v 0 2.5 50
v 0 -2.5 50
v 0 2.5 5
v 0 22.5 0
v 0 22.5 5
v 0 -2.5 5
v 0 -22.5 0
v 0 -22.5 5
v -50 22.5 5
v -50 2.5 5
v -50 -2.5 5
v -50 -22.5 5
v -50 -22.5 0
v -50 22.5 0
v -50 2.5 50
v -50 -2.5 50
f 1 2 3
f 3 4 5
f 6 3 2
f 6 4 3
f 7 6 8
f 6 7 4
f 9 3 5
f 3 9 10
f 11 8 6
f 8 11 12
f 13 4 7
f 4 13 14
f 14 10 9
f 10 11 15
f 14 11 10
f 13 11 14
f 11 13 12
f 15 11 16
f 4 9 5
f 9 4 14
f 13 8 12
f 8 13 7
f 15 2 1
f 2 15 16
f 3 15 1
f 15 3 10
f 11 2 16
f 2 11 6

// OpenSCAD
// Built by bench/smallmodels/features/compiler.py from a list of features.
$fn = 64;
difference() {
  union() {
    translate([-25, 0, 0]) translate([-25, -22.5, 0]) cube([50, 45, 5]);
    translate([-25, 0, 0]) translate([-25, -2.5, 0]) cube([50, 5, 50]);
  }
  union() {
    translate([-17, 30, 3.5]) rotate([0, 0, 0]) rotate([0, 90, 0]) cylinder(d = 4.5, h = 1200, center = true);
    translate([17, 30, 3.5]) rotate([0, 0, 0]) rotate([0, 90, 0]) cylinder(d = 4.5, h = 1200, center = true);
    translate([0, 28, 0]) rotate([0, 0, 0]) translate([-11.5, -1.7, 0]) cube([23, 3.4, 50]);
  }
}
union() {
    translate([-25, 0, 0]) linear_extrude(height = 5) polygon([[-25, 0], [25, 0], [25, 5], [-25, 5]]);
  }
